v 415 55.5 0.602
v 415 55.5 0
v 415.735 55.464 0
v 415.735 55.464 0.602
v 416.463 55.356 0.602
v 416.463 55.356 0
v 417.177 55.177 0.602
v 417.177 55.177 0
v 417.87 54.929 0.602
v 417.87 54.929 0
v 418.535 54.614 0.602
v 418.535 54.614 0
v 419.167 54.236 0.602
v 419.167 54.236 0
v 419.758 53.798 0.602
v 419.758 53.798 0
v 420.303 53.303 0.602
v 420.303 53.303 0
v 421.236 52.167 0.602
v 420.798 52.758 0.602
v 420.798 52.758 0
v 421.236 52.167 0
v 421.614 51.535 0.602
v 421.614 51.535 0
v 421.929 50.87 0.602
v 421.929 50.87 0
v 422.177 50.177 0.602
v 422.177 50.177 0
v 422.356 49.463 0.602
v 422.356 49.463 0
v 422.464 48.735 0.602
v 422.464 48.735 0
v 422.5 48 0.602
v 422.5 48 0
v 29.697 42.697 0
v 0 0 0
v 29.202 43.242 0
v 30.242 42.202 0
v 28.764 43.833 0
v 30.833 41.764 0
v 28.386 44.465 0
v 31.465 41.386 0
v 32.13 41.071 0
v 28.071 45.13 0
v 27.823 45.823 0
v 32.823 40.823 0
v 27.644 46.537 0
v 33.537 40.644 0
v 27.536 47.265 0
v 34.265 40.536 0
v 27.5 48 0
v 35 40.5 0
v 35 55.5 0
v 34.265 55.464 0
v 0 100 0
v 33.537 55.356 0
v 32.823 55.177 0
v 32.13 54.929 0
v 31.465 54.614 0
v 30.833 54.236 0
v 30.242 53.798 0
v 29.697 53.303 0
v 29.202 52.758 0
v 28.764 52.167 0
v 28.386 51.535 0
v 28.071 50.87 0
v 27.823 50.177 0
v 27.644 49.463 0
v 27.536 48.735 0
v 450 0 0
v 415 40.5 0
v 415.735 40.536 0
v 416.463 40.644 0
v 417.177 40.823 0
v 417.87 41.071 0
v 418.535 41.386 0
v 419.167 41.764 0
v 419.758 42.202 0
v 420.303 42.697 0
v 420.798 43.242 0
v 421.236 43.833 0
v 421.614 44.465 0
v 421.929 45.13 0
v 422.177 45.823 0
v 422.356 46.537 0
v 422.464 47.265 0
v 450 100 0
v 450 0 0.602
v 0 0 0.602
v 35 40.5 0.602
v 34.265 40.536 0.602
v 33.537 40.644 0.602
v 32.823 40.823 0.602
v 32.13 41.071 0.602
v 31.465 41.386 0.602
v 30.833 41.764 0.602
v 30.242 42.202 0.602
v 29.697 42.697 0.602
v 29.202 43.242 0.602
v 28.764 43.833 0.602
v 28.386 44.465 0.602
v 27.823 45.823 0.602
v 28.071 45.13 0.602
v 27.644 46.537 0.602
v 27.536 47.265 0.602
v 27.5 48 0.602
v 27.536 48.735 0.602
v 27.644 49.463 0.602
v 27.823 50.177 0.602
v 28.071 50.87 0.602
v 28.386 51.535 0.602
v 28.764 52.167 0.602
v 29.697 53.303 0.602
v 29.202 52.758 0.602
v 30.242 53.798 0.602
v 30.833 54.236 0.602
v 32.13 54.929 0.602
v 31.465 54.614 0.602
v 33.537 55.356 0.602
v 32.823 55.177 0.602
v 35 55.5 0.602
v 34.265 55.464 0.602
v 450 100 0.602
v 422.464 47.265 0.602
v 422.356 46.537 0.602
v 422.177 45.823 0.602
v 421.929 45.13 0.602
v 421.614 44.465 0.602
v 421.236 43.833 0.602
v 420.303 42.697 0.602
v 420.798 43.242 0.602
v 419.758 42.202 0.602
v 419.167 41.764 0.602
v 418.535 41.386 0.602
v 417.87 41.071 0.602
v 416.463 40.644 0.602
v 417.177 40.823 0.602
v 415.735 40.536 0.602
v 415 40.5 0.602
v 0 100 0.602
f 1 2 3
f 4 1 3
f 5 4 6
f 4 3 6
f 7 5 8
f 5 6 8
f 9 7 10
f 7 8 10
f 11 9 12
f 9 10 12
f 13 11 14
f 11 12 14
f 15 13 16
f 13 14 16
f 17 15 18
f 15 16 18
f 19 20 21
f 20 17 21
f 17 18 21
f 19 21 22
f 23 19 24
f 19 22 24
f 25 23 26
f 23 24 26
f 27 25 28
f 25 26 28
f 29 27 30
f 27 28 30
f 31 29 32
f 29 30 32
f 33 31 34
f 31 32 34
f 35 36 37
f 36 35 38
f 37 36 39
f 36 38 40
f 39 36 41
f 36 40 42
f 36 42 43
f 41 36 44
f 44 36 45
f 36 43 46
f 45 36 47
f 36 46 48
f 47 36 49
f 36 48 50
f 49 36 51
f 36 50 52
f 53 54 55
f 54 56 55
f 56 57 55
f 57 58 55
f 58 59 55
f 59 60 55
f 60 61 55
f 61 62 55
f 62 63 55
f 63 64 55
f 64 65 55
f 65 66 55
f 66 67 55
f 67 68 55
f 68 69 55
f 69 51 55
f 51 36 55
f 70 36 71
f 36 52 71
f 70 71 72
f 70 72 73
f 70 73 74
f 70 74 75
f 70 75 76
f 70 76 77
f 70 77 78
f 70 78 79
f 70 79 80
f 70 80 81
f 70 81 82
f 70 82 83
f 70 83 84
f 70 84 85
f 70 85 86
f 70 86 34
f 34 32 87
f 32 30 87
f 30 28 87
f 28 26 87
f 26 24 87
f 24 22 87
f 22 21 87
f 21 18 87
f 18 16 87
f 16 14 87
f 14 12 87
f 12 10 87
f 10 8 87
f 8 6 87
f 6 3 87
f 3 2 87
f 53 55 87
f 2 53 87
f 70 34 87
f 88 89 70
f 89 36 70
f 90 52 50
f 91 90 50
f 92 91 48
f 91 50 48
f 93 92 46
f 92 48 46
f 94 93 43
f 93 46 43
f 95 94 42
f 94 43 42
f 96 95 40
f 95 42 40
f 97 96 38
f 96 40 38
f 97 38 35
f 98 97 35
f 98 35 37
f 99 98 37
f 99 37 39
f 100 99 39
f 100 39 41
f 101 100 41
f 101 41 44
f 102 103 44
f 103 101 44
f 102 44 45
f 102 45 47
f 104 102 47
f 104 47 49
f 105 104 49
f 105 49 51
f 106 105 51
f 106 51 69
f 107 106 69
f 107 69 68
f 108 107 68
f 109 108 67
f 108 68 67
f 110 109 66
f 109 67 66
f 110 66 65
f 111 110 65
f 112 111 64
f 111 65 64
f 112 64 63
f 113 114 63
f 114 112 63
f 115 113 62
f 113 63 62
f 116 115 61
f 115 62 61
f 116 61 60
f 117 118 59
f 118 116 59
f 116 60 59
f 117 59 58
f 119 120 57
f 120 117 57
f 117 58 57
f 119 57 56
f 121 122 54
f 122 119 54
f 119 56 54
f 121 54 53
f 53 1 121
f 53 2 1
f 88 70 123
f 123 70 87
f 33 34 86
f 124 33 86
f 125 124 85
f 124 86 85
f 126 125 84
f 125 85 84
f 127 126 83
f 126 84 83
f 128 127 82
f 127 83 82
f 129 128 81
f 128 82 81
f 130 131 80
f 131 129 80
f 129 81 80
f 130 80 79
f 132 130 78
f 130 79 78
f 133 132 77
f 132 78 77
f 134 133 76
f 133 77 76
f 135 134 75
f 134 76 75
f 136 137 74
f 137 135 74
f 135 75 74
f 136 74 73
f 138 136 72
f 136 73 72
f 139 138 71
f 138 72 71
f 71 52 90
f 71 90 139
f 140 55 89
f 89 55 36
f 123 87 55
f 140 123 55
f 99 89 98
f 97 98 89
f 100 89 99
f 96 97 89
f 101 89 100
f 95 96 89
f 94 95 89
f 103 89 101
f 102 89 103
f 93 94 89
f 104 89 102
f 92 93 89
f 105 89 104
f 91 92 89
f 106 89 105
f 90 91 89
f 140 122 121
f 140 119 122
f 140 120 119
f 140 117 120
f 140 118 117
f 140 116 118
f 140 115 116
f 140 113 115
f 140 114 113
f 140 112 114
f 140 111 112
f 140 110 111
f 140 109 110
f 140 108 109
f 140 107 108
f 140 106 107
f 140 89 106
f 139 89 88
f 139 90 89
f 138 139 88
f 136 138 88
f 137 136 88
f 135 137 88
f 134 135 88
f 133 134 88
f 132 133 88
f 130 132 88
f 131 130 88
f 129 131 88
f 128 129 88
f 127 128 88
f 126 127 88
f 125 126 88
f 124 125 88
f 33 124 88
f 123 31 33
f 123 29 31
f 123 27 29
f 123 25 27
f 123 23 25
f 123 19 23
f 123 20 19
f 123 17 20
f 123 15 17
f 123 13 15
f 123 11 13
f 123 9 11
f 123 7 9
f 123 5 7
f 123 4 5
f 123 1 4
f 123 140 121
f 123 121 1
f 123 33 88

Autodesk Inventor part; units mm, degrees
ref_plane "YZ Plane" through (0, 0, 0) normal (1, 0, 0) x (0, 1, 0)
ref_plane "XZ Plane" through (0, 0, 0) normal (0, 1, 0) x (-1, 0, 0)
ref_plane "XY Plane" through (0, 0, 0) normal (0, 0, 1) x (1, 0, 0)
sketch "Sketch1" plane through (0, 0, 0) normal (0, 0, 1) x (1, 0, 0)
  line L0 (0, 0) -> (450, 0)
  line L1 (450, 0) -> (450, 100)
  line L2 (450, 100) -> (0, 100)
  line L3 (0, 100) -> (0, 0)
  line L4 (35, 40.5) -> (415, 40.5)
  line L5 (415, 40.5) -> (415, 55.5)
  line L6 (415, 55.5) -> (35, 55.5)
  line L7 (35, 55.5) -> (35, 40.5)
  circle A0 centre (35, 48) radius 7.5
  circle A1 centre (415, 48) radius 7.5
  point P0 (35, 40.5)
  point P1 (35, 55.5)
  dimension "d0" = 450
  dimension "d1" = 100
  dimension "d2" = 380
  dimension "d3" = 15
  dimension "d4" = 15
  dimension "d5" = 15
  dimension "d8" = 35
  dimension "d9" = 52
extrude "Extrusion1" add sketch "Sketch1" along normal blind 0.602
equation "\"BendRadius\" = Thickness"
equation "\"BendReliefWidth\" = Thickness"
equation "\"BendReliefDepth\" = 0.5 * Thickness"
equation "\"CornerReliefSize\" = 4 * Thickness"
equation "\"MinimumRemnant\" = 2 * Thickness"
equation "\"TransitionRadius\" = BendRadius"
equation "\"JacobiRadiusSize\" = BendRadius"
equation "\"GapSize\" = Thickness"
equation "\"Thickness\" = 0.602"
properties part number "project slit" material "Steel, Galvanized"
